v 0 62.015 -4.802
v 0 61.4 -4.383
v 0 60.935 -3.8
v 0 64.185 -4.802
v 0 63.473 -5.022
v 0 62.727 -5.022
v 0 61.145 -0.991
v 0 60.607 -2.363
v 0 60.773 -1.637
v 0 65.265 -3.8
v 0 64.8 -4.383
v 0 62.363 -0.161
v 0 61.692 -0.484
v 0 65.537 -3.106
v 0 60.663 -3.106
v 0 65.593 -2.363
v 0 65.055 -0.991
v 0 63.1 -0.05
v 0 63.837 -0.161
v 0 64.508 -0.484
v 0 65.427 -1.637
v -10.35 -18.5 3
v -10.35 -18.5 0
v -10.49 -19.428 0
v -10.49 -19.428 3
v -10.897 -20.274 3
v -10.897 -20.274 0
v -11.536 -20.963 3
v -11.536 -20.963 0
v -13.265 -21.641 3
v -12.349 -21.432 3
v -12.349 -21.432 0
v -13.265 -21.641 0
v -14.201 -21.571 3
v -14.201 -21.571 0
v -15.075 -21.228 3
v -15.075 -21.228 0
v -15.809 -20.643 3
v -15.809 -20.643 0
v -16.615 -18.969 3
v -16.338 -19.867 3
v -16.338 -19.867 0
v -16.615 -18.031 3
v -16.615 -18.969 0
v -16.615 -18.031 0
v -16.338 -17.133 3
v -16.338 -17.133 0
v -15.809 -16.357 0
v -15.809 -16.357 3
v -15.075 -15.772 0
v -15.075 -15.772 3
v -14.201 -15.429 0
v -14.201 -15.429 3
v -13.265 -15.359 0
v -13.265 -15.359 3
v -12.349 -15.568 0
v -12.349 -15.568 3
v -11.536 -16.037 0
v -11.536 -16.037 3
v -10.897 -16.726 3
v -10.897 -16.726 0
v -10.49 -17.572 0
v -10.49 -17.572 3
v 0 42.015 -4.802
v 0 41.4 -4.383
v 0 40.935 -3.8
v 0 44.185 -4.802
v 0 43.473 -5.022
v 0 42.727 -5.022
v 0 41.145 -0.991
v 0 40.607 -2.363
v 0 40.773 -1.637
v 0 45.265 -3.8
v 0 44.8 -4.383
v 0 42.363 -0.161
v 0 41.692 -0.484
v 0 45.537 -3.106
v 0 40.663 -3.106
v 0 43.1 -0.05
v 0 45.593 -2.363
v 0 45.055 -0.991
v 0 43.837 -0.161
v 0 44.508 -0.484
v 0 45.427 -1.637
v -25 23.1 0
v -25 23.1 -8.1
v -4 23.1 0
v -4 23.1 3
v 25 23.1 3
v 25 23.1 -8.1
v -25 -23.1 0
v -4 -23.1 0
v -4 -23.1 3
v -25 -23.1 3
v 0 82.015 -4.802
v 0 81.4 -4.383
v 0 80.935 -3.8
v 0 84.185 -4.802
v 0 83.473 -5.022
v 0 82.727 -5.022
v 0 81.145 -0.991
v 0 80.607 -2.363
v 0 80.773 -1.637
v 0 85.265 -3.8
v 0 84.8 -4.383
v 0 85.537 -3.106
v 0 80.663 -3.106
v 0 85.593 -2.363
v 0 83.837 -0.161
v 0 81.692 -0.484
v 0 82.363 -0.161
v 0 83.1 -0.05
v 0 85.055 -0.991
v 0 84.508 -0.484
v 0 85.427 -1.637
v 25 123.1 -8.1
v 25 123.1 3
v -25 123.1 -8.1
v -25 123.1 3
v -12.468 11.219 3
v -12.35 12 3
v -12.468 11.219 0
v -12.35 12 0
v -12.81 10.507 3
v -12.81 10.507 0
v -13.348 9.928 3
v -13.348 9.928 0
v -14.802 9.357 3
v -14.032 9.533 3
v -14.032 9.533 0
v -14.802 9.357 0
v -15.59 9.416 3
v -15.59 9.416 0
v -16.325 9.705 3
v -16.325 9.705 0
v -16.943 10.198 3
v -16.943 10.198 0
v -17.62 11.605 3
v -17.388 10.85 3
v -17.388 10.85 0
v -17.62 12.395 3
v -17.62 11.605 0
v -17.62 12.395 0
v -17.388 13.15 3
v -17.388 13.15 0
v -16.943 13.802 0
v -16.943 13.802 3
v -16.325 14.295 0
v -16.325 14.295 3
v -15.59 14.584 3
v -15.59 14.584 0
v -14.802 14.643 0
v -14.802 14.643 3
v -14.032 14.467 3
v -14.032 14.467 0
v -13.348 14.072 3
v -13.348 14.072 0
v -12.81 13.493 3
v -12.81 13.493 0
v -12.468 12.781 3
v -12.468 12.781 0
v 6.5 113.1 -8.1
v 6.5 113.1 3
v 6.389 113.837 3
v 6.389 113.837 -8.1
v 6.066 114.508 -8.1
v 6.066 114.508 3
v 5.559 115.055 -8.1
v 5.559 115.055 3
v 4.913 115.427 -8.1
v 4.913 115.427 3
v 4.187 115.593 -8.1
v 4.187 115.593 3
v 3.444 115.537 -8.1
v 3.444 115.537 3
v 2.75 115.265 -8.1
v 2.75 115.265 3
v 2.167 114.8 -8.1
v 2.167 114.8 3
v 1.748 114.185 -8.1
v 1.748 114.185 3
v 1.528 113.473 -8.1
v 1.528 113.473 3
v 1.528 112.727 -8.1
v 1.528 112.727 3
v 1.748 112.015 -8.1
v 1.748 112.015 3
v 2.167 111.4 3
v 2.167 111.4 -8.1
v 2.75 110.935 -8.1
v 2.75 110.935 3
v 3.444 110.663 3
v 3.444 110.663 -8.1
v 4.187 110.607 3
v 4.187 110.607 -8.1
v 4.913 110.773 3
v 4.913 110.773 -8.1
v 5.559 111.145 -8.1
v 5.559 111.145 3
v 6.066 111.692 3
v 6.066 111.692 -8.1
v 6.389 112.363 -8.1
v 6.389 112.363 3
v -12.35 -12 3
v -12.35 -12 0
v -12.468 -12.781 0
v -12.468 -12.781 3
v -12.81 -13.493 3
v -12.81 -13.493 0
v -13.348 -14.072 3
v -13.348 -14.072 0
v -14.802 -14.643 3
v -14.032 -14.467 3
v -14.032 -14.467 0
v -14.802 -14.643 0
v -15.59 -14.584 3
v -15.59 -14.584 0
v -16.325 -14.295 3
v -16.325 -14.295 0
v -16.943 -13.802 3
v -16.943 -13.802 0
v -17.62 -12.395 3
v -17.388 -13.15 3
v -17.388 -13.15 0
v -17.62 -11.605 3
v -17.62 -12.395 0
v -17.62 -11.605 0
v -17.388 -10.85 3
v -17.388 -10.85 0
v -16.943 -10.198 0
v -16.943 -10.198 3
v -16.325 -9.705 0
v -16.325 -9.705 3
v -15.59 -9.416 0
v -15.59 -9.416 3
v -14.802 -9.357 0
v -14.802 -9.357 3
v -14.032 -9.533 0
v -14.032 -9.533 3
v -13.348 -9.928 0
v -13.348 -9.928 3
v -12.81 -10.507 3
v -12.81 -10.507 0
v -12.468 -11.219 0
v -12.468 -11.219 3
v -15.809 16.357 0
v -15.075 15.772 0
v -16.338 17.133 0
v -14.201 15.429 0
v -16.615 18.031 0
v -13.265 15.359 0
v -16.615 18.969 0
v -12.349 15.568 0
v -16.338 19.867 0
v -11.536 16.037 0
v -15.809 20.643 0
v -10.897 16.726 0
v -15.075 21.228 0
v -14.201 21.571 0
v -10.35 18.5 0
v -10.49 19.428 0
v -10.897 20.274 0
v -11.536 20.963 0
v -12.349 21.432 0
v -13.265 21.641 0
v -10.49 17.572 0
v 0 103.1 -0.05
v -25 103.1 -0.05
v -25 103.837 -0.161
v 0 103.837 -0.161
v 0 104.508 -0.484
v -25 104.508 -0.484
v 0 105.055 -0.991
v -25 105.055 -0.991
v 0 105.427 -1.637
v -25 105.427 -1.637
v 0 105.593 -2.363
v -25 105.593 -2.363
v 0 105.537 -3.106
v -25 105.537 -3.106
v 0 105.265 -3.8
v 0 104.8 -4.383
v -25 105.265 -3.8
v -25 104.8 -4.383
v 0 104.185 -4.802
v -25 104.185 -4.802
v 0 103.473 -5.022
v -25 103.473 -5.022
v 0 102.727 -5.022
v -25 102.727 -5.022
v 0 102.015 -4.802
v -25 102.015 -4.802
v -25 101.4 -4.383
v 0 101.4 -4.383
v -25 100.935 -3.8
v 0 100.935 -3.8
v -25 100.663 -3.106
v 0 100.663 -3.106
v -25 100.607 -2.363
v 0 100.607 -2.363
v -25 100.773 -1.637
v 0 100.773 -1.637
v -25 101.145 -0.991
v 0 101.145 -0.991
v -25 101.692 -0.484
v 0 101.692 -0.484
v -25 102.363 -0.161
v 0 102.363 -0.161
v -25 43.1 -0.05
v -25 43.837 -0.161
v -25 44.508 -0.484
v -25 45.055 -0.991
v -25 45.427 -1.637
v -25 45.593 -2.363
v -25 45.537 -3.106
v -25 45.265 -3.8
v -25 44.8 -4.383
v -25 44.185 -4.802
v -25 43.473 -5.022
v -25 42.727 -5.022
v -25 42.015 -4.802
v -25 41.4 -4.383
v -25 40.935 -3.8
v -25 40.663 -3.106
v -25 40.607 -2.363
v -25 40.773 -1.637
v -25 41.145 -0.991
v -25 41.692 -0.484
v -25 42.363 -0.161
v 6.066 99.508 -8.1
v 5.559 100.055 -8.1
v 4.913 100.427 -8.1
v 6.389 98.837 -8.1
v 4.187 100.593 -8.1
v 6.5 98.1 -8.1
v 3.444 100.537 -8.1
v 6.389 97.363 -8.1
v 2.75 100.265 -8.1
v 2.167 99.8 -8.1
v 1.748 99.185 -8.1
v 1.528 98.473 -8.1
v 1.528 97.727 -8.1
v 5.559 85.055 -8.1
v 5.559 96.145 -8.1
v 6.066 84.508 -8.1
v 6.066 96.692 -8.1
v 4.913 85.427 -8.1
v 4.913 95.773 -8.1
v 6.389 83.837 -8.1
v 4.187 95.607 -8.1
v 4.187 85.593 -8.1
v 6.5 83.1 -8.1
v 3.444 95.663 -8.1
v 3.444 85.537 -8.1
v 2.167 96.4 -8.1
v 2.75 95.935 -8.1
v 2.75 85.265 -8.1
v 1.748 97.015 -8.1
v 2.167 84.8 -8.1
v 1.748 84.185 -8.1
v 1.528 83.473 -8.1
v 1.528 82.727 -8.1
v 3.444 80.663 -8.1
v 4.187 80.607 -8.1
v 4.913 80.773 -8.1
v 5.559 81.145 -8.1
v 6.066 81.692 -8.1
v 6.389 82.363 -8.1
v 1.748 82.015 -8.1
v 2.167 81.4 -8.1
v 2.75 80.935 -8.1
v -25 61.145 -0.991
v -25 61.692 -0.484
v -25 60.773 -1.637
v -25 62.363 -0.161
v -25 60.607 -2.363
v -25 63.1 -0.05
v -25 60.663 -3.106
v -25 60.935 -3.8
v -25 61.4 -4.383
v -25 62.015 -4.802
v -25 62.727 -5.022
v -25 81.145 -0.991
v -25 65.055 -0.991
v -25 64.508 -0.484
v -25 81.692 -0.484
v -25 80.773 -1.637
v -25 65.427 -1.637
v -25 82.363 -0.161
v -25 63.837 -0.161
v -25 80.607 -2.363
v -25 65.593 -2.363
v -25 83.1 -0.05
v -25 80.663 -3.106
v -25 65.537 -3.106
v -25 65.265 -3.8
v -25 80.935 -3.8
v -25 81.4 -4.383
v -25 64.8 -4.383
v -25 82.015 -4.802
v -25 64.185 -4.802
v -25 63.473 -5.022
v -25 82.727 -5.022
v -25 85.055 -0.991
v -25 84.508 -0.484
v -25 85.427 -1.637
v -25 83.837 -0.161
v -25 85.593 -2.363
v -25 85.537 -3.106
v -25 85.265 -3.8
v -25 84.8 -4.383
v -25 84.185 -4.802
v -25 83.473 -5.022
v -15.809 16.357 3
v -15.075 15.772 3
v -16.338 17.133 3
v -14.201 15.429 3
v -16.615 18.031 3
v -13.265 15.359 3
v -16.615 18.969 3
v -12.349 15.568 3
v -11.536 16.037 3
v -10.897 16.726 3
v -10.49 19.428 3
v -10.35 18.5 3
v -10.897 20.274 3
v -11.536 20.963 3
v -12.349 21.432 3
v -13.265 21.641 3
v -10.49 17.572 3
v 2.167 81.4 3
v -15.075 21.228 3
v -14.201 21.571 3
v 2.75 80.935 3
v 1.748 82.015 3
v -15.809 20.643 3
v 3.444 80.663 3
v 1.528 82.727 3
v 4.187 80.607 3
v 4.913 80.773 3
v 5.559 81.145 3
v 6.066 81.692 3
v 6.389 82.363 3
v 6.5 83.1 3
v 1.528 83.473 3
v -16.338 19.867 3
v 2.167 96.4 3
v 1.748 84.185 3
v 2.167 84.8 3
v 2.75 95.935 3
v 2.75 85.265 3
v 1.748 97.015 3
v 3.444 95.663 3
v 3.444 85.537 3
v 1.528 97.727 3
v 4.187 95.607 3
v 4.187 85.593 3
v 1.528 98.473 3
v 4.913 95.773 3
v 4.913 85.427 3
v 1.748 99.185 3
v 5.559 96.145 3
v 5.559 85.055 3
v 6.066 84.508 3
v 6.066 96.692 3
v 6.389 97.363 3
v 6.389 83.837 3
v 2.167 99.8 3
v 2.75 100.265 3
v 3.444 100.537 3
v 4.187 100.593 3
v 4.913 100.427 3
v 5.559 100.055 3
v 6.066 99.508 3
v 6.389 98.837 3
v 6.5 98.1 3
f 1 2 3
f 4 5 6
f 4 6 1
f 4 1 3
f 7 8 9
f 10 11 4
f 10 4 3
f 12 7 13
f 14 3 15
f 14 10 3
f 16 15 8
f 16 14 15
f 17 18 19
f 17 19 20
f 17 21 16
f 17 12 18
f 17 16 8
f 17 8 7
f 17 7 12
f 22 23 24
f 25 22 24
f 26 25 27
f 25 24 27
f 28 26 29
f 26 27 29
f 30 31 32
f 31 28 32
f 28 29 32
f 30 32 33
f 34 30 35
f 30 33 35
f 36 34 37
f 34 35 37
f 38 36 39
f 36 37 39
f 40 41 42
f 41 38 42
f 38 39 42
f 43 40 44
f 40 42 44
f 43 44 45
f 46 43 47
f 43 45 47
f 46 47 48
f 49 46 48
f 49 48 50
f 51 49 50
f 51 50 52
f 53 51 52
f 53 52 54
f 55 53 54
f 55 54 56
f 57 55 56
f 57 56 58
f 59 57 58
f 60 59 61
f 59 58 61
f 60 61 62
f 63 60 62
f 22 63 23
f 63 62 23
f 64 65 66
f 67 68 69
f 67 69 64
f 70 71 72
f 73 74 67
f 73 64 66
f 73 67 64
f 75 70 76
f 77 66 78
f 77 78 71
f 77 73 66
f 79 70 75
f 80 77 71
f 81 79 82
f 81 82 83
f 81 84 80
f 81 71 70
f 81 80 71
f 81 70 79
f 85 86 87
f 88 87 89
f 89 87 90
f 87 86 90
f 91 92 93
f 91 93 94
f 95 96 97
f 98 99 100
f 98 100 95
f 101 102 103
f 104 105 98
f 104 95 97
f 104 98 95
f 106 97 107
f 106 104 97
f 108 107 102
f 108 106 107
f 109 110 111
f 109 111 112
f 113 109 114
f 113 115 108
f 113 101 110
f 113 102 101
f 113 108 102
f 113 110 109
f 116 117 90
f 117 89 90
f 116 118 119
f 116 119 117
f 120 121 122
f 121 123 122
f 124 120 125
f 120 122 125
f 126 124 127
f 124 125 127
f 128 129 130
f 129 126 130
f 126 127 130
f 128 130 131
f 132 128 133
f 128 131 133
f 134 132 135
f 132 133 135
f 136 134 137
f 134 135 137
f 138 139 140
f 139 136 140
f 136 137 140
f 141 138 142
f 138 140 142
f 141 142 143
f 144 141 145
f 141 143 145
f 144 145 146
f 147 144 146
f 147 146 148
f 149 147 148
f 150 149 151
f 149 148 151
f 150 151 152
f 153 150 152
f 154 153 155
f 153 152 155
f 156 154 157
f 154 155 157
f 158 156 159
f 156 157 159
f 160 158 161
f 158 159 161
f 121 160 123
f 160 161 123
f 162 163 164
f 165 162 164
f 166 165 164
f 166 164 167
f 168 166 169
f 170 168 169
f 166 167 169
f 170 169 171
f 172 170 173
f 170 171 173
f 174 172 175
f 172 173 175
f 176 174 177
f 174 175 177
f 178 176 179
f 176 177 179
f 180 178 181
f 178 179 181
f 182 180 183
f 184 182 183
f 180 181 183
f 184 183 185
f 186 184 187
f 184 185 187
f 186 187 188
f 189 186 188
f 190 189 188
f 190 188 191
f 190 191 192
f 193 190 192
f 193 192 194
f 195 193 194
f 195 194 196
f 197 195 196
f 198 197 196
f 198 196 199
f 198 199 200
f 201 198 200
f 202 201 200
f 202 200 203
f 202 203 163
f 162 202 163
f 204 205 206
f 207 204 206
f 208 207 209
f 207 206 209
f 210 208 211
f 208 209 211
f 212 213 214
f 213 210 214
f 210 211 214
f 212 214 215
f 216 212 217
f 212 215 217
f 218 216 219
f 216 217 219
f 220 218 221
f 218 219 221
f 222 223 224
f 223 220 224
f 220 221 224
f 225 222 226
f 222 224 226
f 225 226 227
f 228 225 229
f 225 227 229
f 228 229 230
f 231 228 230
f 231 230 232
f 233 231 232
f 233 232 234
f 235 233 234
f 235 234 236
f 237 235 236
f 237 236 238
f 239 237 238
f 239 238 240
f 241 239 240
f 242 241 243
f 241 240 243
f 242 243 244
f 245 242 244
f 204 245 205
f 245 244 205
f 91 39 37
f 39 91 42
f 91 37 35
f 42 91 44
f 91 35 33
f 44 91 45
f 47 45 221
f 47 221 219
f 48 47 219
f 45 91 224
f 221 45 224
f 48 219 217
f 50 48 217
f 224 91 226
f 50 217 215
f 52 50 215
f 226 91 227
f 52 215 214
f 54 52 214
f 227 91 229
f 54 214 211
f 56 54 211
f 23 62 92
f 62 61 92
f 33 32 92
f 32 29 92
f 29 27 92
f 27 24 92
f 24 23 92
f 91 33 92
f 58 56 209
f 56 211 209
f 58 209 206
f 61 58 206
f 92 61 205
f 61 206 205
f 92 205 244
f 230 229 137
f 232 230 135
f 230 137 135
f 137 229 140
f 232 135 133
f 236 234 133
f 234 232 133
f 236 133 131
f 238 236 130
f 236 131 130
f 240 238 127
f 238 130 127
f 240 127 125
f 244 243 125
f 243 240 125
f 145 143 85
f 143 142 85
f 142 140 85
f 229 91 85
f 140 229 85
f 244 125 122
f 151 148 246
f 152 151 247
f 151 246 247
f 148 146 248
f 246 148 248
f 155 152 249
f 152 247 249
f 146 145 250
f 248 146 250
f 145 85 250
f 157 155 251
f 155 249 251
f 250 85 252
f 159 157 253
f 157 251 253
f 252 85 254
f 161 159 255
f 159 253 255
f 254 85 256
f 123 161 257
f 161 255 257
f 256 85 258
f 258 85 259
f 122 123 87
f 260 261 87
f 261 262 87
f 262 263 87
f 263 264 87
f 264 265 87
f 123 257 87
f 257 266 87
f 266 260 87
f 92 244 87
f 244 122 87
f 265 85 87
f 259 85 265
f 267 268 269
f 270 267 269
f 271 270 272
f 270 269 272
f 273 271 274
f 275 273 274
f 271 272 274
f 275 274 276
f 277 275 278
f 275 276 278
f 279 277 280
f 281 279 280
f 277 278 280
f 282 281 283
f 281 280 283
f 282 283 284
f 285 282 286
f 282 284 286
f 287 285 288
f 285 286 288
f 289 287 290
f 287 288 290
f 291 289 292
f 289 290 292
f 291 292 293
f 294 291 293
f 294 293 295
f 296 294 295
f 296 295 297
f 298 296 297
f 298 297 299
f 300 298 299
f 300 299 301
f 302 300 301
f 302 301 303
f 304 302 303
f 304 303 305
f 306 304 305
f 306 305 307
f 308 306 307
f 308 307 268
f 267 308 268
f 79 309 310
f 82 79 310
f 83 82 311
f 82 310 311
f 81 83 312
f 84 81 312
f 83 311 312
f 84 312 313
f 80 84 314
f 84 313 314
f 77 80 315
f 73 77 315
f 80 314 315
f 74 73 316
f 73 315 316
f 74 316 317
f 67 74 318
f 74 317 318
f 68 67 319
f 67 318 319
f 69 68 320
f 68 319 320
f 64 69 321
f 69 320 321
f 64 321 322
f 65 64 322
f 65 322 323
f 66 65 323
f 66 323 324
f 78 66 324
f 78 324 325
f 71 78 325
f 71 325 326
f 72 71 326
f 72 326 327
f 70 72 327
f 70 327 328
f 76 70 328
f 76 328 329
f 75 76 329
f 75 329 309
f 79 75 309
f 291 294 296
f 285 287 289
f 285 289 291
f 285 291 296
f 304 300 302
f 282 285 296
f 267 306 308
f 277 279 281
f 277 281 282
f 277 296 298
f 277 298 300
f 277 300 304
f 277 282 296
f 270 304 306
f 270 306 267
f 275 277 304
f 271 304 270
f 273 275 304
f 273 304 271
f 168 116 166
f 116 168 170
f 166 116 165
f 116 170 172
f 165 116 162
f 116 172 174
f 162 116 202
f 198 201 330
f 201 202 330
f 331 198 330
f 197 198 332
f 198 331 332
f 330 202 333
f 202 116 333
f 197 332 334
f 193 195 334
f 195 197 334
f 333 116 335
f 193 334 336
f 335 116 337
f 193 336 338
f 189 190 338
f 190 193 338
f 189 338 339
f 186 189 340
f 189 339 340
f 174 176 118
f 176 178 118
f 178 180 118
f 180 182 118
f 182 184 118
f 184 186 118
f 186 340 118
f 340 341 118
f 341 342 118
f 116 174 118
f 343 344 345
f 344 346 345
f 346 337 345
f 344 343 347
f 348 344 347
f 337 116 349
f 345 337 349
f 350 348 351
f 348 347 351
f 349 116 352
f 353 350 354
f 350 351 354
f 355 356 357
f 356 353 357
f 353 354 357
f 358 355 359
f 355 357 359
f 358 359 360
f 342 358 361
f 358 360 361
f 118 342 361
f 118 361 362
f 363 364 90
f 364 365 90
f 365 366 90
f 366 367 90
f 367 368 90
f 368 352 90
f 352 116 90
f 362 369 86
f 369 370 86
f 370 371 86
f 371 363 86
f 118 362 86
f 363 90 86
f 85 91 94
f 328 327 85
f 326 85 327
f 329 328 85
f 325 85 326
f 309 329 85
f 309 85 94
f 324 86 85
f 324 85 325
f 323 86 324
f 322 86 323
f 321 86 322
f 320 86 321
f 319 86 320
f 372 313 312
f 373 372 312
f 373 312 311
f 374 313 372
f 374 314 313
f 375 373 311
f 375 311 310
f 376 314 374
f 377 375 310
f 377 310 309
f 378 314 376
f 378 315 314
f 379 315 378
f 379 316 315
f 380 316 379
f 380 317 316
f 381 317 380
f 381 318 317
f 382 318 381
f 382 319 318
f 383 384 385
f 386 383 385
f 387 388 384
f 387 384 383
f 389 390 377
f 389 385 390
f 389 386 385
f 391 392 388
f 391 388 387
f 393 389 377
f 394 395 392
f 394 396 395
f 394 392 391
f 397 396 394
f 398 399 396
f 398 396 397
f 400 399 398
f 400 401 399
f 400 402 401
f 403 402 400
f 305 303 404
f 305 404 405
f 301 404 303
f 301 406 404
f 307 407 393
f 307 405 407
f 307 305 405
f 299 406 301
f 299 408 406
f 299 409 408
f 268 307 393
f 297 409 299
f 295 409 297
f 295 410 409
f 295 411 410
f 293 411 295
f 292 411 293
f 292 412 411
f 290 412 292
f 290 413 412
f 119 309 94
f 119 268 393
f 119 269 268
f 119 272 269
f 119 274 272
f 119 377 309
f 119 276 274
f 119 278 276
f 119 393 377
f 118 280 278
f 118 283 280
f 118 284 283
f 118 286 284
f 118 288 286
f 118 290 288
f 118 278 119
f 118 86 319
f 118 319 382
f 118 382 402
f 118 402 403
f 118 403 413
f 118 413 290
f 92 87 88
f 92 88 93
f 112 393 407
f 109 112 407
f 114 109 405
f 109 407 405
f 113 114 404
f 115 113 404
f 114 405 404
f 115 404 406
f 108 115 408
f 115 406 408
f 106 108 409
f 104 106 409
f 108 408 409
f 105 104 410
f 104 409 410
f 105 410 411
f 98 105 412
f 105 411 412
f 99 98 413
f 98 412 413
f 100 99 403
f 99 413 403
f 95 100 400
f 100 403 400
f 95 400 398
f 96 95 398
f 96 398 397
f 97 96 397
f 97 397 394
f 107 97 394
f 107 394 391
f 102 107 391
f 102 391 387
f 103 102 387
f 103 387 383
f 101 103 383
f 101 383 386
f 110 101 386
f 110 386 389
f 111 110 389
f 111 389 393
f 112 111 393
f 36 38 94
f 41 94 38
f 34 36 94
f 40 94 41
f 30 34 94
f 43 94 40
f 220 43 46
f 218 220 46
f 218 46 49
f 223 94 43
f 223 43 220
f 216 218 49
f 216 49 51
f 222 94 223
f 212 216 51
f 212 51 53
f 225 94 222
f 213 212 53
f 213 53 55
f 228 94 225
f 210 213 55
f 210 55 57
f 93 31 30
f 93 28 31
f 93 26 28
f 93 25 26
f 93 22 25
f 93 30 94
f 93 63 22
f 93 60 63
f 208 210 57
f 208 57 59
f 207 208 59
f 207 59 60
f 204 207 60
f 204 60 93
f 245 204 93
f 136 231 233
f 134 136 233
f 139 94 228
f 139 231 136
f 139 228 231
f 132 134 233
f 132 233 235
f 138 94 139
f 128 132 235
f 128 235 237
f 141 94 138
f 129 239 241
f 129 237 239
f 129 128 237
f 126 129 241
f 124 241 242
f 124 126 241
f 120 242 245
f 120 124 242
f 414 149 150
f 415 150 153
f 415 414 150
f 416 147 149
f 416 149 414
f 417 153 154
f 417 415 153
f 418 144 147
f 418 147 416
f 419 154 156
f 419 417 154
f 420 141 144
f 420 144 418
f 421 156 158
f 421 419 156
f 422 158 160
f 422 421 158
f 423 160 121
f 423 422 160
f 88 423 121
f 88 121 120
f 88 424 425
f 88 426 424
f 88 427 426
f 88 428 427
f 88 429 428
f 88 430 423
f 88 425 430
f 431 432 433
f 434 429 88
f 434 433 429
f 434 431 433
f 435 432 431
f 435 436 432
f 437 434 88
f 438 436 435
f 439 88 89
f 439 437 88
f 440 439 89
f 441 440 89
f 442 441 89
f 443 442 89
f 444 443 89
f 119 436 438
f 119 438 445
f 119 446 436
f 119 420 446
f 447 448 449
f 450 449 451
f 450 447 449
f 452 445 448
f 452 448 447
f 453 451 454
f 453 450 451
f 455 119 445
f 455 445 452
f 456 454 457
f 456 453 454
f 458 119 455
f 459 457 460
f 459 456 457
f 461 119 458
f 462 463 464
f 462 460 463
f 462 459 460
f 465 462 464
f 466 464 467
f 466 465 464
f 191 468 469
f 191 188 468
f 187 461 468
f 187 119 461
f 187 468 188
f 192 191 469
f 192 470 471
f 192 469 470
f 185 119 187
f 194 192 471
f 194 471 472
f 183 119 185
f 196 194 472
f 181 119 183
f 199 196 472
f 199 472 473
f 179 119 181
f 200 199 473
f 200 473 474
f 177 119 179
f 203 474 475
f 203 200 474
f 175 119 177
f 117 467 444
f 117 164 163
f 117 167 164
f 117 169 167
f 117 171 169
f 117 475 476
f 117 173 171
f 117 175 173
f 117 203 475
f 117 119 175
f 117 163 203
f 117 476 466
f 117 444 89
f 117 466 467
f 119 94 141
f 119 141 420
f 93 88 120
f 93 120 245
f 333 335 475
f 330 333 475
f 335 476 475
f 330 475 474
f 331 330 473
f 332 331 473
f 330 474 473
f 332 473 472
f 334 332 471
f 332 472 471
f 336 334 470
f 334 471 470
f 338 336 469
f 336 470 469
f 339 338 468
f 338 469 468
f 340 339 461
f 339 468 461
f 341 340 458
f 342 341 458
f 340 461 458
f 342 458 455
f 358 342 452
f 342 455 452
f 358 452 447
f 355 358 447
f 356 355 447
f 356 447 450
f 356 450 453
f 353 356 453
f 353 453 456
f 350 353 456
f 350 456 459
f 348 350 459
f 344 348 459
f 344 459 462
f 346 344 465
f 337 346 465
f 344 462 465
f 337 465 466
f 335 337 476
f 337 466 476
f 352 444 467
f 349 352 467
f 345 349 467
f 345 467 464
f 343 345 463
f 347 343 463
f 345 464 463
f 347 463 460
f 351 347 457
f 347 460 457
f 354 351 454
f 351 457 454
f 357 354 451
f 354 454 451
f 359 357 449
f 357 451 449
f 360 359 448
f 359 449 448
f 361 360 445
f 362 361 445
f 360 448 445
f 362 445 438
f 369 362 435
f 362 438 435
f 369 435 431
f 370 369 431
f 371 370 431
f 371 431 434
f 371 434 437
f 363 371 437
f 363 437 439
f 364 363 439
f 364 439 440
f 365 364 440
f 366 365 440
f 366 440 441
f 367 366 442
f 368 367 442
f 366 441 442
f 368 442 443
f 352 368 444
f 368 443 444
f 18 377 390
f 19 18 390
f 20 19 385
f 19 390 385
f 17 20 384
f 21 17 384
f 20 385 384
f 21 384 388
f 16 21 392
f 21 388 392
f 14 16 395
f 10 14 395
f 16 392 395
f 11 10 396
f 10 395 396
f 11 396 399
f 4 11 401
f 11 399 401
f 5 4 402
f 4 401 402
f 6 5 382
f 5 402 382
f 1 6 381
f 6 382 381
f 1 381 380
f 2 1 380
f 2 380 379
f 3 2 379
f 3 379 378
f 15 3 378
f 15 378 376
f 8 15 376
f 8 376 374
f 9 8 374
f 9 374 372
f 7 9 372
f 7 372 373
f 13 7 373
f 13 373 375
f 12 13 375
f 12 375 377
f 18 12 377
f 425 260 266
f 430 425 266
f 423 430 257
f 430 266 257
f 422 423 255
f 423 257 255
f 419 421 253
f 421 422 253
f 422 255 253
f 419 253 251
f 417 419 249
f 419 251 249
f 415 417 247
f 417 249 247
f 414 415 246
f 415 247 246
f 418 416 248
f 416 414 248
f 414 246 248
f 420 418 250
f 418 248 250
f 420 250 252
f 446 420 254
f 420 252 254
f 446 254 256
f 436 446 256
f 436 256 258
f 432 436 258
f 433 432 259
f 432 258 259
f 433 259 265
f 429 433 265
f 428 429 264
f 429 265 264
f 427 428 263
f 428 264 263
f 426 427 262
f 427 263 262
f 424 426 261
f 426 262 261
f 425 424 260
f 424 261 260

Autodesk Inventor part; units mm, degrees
ref_plane "YZ Plane" through (0, 0, 0) normal (1, 0, 0) x (0, 1, 0)
ref_plane "XZ Plane" through (0, 0, 0) normal (0, 1, 0) x (-1, 0, 0)
ref_plane "XY Plane" through (0, 0, 0) normal (0, 0, 1) x (1, 0, 0)
ref_plane "Work Plane1" through (0, 0, 0) normal (0, 0, 1) x (1, 0, 0)
sketch "Sketch1" plane through (0, 0, 0) normal (0, 0, 1) x (1, 0, 0)
  circle A0 centre (-13.5, -18.5) radius 3.15 projected
  circle A1 centre (-13.5, 18.5) radius 3.15 projected
  line L0 (-25, -23) -> (25, -23) construction
  line L1 (25, -23) -> (25, 23) projected
  line L2 (25, 23) -> (-25, 23) construction
  line L3 (-25, 23) -> (-25, -23) construction
  circle A2 centre (-15, 12) radius 2.65 projected
  circle A3 centre (-15, -12) radius 2.65 projected
  circle A4 centre (12, 0) radius 4.15 projected
  line L4 (-25, -11.95) -> (-20, -11.95) construction
  line L5 (-20, -11.95) -> (-20, -7.95) construction
  line L6 (-20, -7.95) -> (-25, -7.95) construction
  line L7 (-25, 7.95) -> (-25, -7.95) construction
  line L8 (-25, 7.95) -> (-20, 7.95) construction
  line L9 (-20, 7.95) -> (-20, 11.95) construction
  line L10 (-20, 11.95) -> (-25, 11.95) construction
  line L11 (-25, 19.95) -> (-25, 11.95) construction
  line L12 (-25, 19.95) -> (-4, 19.95) construction
  line L13 (-4, 11.95) -> (-4, 19.95) construction
  line L14 (-4, 11.95) -> (-9, 11.95) construction
  line L15 (-9, 11.95) -> (-9, 7.95) construction
  line L16 (-9, 7.95) -> (-4, 7.95) construction
  line L17 (-4, -7.95) -> (-4, 7.95) construction
  line L18 (-4, -7.95) -> (-9, -7.95) construction
  line L19 (-9, -7.95) -> (-9, -11.95) construction
  line L20 (-9, -11.95) -> (-4, -11.95) construction
  line L21 (-4, -19.95) -> (-4, -11.95) construction
  line L22 (-4, -19.95) -> (-25, -19.95) construction
  line L23 (-25, -11.95) -> (-25, -19.95) construction
  line L24 (-4, -23.1) -> (-25, -23.1)
  line L25 (-25, -23.1) -> (-25, 23.1)
  line L26 (-25, 23.1) -> (-4, 23.1)
  line L27 (-4, 23.1) -> (-4, -23.1)
  point P0 (0, 0)
  dimension "d3" = 0.1
  dimension "d4" = 0.1
extrude "Extrusion1" add sketch "Sketch1" along normal blind 3 contours L24 L25 L26 L27
sketch "Sketch3" plane through (-25, 23.1, 0) normal (0, 1, 0) x (1, 0, 0)
  line L0 (50, 8.1) -> (0, 8.1) construction
  line L1 (0, 8.1) -> (0, 0.1) construction
  line L2 (50, 0.1) -> (0, 0.1) construction
  line L3 (50, 8.1) -> (50, 0.1) construction
  line L4 (21, 0) -> (0, 0) construction
  line L5 (0, 0) -> (0, -3) construction
  line L6 (21, -3) -> (0, -3) construction
  line L7 (21, 0) -> (21, -3) construction
  line L8 (21, -3) -> (0, -3) projected
  line L9 (0, -3) -> (50, -3)
  line L10 (50, -3) -> (50, 8.1)
  line L11 (50, 8.1) -> (0, 8.1)
  line L12 (0, 8.1) -> (0, -3)
  point P0 (25, 0)
extrude "Extrusion2" add sketch "Sketch3" along normal blind 100
sketch "Sketch5" plane through (-25, -23.1, 0) normal (-1, 0, 0) x (0, 0, 1)
  circle A0 centre (-2.55, 126.2) radius 2.65 construction
  circle A1 centre (-2.55, 106.2) radius 2.65 construction
  circle A2 centre (-2.55, 86.2) radius 2.65 construction
  circle A3 centre (-2.55, 66.2) radius 2.65 construction
  circle A4 centre (-2.55, 126.2) radius 2.5
  line L0 (-2.55, 126.2) -> (-2.55, 106.2) construction
  circle A5 centre (-2.55, 106.2) radius 2.5
  circle A6 centre (-2.55, 86.2) radius 2.5
  circle A7 centre (-2.55, 66.2) radius 2.5
  point P0 (0, 23.1)
  dimension "d17" = 5
  dimension "d20" = 20
extrude "Extrusion4" cut sketch "Sketch5" against normal blind 25
sketch "Sketch6" plane through (0, 0, 3) normal (0, 0, 1) x (1, 0, 0)
  circle A0 centre (4, 83.1) radius 2.65 construction
  circle A1 centre (4, 98.1) radius 2.65 construction
  circle A2 centre (4, 113.1) radius 2.65 construction
  circle A3 centre (4, 83.1) radius 2.5
  circle A4 centre (4, 98.1) radius 2.5
  circle A5 centre (4, 113.1) radius 2.5
  point P0 (0, 0)
  dimension "d27" = 5
  dimension "d28" = 5
  dimension "d29" = 5
extrude "Extrusion5" cut sketch "Sketch6" against normal through all
equation "\"d4\" = d3"
properties part number "endcap insert"
